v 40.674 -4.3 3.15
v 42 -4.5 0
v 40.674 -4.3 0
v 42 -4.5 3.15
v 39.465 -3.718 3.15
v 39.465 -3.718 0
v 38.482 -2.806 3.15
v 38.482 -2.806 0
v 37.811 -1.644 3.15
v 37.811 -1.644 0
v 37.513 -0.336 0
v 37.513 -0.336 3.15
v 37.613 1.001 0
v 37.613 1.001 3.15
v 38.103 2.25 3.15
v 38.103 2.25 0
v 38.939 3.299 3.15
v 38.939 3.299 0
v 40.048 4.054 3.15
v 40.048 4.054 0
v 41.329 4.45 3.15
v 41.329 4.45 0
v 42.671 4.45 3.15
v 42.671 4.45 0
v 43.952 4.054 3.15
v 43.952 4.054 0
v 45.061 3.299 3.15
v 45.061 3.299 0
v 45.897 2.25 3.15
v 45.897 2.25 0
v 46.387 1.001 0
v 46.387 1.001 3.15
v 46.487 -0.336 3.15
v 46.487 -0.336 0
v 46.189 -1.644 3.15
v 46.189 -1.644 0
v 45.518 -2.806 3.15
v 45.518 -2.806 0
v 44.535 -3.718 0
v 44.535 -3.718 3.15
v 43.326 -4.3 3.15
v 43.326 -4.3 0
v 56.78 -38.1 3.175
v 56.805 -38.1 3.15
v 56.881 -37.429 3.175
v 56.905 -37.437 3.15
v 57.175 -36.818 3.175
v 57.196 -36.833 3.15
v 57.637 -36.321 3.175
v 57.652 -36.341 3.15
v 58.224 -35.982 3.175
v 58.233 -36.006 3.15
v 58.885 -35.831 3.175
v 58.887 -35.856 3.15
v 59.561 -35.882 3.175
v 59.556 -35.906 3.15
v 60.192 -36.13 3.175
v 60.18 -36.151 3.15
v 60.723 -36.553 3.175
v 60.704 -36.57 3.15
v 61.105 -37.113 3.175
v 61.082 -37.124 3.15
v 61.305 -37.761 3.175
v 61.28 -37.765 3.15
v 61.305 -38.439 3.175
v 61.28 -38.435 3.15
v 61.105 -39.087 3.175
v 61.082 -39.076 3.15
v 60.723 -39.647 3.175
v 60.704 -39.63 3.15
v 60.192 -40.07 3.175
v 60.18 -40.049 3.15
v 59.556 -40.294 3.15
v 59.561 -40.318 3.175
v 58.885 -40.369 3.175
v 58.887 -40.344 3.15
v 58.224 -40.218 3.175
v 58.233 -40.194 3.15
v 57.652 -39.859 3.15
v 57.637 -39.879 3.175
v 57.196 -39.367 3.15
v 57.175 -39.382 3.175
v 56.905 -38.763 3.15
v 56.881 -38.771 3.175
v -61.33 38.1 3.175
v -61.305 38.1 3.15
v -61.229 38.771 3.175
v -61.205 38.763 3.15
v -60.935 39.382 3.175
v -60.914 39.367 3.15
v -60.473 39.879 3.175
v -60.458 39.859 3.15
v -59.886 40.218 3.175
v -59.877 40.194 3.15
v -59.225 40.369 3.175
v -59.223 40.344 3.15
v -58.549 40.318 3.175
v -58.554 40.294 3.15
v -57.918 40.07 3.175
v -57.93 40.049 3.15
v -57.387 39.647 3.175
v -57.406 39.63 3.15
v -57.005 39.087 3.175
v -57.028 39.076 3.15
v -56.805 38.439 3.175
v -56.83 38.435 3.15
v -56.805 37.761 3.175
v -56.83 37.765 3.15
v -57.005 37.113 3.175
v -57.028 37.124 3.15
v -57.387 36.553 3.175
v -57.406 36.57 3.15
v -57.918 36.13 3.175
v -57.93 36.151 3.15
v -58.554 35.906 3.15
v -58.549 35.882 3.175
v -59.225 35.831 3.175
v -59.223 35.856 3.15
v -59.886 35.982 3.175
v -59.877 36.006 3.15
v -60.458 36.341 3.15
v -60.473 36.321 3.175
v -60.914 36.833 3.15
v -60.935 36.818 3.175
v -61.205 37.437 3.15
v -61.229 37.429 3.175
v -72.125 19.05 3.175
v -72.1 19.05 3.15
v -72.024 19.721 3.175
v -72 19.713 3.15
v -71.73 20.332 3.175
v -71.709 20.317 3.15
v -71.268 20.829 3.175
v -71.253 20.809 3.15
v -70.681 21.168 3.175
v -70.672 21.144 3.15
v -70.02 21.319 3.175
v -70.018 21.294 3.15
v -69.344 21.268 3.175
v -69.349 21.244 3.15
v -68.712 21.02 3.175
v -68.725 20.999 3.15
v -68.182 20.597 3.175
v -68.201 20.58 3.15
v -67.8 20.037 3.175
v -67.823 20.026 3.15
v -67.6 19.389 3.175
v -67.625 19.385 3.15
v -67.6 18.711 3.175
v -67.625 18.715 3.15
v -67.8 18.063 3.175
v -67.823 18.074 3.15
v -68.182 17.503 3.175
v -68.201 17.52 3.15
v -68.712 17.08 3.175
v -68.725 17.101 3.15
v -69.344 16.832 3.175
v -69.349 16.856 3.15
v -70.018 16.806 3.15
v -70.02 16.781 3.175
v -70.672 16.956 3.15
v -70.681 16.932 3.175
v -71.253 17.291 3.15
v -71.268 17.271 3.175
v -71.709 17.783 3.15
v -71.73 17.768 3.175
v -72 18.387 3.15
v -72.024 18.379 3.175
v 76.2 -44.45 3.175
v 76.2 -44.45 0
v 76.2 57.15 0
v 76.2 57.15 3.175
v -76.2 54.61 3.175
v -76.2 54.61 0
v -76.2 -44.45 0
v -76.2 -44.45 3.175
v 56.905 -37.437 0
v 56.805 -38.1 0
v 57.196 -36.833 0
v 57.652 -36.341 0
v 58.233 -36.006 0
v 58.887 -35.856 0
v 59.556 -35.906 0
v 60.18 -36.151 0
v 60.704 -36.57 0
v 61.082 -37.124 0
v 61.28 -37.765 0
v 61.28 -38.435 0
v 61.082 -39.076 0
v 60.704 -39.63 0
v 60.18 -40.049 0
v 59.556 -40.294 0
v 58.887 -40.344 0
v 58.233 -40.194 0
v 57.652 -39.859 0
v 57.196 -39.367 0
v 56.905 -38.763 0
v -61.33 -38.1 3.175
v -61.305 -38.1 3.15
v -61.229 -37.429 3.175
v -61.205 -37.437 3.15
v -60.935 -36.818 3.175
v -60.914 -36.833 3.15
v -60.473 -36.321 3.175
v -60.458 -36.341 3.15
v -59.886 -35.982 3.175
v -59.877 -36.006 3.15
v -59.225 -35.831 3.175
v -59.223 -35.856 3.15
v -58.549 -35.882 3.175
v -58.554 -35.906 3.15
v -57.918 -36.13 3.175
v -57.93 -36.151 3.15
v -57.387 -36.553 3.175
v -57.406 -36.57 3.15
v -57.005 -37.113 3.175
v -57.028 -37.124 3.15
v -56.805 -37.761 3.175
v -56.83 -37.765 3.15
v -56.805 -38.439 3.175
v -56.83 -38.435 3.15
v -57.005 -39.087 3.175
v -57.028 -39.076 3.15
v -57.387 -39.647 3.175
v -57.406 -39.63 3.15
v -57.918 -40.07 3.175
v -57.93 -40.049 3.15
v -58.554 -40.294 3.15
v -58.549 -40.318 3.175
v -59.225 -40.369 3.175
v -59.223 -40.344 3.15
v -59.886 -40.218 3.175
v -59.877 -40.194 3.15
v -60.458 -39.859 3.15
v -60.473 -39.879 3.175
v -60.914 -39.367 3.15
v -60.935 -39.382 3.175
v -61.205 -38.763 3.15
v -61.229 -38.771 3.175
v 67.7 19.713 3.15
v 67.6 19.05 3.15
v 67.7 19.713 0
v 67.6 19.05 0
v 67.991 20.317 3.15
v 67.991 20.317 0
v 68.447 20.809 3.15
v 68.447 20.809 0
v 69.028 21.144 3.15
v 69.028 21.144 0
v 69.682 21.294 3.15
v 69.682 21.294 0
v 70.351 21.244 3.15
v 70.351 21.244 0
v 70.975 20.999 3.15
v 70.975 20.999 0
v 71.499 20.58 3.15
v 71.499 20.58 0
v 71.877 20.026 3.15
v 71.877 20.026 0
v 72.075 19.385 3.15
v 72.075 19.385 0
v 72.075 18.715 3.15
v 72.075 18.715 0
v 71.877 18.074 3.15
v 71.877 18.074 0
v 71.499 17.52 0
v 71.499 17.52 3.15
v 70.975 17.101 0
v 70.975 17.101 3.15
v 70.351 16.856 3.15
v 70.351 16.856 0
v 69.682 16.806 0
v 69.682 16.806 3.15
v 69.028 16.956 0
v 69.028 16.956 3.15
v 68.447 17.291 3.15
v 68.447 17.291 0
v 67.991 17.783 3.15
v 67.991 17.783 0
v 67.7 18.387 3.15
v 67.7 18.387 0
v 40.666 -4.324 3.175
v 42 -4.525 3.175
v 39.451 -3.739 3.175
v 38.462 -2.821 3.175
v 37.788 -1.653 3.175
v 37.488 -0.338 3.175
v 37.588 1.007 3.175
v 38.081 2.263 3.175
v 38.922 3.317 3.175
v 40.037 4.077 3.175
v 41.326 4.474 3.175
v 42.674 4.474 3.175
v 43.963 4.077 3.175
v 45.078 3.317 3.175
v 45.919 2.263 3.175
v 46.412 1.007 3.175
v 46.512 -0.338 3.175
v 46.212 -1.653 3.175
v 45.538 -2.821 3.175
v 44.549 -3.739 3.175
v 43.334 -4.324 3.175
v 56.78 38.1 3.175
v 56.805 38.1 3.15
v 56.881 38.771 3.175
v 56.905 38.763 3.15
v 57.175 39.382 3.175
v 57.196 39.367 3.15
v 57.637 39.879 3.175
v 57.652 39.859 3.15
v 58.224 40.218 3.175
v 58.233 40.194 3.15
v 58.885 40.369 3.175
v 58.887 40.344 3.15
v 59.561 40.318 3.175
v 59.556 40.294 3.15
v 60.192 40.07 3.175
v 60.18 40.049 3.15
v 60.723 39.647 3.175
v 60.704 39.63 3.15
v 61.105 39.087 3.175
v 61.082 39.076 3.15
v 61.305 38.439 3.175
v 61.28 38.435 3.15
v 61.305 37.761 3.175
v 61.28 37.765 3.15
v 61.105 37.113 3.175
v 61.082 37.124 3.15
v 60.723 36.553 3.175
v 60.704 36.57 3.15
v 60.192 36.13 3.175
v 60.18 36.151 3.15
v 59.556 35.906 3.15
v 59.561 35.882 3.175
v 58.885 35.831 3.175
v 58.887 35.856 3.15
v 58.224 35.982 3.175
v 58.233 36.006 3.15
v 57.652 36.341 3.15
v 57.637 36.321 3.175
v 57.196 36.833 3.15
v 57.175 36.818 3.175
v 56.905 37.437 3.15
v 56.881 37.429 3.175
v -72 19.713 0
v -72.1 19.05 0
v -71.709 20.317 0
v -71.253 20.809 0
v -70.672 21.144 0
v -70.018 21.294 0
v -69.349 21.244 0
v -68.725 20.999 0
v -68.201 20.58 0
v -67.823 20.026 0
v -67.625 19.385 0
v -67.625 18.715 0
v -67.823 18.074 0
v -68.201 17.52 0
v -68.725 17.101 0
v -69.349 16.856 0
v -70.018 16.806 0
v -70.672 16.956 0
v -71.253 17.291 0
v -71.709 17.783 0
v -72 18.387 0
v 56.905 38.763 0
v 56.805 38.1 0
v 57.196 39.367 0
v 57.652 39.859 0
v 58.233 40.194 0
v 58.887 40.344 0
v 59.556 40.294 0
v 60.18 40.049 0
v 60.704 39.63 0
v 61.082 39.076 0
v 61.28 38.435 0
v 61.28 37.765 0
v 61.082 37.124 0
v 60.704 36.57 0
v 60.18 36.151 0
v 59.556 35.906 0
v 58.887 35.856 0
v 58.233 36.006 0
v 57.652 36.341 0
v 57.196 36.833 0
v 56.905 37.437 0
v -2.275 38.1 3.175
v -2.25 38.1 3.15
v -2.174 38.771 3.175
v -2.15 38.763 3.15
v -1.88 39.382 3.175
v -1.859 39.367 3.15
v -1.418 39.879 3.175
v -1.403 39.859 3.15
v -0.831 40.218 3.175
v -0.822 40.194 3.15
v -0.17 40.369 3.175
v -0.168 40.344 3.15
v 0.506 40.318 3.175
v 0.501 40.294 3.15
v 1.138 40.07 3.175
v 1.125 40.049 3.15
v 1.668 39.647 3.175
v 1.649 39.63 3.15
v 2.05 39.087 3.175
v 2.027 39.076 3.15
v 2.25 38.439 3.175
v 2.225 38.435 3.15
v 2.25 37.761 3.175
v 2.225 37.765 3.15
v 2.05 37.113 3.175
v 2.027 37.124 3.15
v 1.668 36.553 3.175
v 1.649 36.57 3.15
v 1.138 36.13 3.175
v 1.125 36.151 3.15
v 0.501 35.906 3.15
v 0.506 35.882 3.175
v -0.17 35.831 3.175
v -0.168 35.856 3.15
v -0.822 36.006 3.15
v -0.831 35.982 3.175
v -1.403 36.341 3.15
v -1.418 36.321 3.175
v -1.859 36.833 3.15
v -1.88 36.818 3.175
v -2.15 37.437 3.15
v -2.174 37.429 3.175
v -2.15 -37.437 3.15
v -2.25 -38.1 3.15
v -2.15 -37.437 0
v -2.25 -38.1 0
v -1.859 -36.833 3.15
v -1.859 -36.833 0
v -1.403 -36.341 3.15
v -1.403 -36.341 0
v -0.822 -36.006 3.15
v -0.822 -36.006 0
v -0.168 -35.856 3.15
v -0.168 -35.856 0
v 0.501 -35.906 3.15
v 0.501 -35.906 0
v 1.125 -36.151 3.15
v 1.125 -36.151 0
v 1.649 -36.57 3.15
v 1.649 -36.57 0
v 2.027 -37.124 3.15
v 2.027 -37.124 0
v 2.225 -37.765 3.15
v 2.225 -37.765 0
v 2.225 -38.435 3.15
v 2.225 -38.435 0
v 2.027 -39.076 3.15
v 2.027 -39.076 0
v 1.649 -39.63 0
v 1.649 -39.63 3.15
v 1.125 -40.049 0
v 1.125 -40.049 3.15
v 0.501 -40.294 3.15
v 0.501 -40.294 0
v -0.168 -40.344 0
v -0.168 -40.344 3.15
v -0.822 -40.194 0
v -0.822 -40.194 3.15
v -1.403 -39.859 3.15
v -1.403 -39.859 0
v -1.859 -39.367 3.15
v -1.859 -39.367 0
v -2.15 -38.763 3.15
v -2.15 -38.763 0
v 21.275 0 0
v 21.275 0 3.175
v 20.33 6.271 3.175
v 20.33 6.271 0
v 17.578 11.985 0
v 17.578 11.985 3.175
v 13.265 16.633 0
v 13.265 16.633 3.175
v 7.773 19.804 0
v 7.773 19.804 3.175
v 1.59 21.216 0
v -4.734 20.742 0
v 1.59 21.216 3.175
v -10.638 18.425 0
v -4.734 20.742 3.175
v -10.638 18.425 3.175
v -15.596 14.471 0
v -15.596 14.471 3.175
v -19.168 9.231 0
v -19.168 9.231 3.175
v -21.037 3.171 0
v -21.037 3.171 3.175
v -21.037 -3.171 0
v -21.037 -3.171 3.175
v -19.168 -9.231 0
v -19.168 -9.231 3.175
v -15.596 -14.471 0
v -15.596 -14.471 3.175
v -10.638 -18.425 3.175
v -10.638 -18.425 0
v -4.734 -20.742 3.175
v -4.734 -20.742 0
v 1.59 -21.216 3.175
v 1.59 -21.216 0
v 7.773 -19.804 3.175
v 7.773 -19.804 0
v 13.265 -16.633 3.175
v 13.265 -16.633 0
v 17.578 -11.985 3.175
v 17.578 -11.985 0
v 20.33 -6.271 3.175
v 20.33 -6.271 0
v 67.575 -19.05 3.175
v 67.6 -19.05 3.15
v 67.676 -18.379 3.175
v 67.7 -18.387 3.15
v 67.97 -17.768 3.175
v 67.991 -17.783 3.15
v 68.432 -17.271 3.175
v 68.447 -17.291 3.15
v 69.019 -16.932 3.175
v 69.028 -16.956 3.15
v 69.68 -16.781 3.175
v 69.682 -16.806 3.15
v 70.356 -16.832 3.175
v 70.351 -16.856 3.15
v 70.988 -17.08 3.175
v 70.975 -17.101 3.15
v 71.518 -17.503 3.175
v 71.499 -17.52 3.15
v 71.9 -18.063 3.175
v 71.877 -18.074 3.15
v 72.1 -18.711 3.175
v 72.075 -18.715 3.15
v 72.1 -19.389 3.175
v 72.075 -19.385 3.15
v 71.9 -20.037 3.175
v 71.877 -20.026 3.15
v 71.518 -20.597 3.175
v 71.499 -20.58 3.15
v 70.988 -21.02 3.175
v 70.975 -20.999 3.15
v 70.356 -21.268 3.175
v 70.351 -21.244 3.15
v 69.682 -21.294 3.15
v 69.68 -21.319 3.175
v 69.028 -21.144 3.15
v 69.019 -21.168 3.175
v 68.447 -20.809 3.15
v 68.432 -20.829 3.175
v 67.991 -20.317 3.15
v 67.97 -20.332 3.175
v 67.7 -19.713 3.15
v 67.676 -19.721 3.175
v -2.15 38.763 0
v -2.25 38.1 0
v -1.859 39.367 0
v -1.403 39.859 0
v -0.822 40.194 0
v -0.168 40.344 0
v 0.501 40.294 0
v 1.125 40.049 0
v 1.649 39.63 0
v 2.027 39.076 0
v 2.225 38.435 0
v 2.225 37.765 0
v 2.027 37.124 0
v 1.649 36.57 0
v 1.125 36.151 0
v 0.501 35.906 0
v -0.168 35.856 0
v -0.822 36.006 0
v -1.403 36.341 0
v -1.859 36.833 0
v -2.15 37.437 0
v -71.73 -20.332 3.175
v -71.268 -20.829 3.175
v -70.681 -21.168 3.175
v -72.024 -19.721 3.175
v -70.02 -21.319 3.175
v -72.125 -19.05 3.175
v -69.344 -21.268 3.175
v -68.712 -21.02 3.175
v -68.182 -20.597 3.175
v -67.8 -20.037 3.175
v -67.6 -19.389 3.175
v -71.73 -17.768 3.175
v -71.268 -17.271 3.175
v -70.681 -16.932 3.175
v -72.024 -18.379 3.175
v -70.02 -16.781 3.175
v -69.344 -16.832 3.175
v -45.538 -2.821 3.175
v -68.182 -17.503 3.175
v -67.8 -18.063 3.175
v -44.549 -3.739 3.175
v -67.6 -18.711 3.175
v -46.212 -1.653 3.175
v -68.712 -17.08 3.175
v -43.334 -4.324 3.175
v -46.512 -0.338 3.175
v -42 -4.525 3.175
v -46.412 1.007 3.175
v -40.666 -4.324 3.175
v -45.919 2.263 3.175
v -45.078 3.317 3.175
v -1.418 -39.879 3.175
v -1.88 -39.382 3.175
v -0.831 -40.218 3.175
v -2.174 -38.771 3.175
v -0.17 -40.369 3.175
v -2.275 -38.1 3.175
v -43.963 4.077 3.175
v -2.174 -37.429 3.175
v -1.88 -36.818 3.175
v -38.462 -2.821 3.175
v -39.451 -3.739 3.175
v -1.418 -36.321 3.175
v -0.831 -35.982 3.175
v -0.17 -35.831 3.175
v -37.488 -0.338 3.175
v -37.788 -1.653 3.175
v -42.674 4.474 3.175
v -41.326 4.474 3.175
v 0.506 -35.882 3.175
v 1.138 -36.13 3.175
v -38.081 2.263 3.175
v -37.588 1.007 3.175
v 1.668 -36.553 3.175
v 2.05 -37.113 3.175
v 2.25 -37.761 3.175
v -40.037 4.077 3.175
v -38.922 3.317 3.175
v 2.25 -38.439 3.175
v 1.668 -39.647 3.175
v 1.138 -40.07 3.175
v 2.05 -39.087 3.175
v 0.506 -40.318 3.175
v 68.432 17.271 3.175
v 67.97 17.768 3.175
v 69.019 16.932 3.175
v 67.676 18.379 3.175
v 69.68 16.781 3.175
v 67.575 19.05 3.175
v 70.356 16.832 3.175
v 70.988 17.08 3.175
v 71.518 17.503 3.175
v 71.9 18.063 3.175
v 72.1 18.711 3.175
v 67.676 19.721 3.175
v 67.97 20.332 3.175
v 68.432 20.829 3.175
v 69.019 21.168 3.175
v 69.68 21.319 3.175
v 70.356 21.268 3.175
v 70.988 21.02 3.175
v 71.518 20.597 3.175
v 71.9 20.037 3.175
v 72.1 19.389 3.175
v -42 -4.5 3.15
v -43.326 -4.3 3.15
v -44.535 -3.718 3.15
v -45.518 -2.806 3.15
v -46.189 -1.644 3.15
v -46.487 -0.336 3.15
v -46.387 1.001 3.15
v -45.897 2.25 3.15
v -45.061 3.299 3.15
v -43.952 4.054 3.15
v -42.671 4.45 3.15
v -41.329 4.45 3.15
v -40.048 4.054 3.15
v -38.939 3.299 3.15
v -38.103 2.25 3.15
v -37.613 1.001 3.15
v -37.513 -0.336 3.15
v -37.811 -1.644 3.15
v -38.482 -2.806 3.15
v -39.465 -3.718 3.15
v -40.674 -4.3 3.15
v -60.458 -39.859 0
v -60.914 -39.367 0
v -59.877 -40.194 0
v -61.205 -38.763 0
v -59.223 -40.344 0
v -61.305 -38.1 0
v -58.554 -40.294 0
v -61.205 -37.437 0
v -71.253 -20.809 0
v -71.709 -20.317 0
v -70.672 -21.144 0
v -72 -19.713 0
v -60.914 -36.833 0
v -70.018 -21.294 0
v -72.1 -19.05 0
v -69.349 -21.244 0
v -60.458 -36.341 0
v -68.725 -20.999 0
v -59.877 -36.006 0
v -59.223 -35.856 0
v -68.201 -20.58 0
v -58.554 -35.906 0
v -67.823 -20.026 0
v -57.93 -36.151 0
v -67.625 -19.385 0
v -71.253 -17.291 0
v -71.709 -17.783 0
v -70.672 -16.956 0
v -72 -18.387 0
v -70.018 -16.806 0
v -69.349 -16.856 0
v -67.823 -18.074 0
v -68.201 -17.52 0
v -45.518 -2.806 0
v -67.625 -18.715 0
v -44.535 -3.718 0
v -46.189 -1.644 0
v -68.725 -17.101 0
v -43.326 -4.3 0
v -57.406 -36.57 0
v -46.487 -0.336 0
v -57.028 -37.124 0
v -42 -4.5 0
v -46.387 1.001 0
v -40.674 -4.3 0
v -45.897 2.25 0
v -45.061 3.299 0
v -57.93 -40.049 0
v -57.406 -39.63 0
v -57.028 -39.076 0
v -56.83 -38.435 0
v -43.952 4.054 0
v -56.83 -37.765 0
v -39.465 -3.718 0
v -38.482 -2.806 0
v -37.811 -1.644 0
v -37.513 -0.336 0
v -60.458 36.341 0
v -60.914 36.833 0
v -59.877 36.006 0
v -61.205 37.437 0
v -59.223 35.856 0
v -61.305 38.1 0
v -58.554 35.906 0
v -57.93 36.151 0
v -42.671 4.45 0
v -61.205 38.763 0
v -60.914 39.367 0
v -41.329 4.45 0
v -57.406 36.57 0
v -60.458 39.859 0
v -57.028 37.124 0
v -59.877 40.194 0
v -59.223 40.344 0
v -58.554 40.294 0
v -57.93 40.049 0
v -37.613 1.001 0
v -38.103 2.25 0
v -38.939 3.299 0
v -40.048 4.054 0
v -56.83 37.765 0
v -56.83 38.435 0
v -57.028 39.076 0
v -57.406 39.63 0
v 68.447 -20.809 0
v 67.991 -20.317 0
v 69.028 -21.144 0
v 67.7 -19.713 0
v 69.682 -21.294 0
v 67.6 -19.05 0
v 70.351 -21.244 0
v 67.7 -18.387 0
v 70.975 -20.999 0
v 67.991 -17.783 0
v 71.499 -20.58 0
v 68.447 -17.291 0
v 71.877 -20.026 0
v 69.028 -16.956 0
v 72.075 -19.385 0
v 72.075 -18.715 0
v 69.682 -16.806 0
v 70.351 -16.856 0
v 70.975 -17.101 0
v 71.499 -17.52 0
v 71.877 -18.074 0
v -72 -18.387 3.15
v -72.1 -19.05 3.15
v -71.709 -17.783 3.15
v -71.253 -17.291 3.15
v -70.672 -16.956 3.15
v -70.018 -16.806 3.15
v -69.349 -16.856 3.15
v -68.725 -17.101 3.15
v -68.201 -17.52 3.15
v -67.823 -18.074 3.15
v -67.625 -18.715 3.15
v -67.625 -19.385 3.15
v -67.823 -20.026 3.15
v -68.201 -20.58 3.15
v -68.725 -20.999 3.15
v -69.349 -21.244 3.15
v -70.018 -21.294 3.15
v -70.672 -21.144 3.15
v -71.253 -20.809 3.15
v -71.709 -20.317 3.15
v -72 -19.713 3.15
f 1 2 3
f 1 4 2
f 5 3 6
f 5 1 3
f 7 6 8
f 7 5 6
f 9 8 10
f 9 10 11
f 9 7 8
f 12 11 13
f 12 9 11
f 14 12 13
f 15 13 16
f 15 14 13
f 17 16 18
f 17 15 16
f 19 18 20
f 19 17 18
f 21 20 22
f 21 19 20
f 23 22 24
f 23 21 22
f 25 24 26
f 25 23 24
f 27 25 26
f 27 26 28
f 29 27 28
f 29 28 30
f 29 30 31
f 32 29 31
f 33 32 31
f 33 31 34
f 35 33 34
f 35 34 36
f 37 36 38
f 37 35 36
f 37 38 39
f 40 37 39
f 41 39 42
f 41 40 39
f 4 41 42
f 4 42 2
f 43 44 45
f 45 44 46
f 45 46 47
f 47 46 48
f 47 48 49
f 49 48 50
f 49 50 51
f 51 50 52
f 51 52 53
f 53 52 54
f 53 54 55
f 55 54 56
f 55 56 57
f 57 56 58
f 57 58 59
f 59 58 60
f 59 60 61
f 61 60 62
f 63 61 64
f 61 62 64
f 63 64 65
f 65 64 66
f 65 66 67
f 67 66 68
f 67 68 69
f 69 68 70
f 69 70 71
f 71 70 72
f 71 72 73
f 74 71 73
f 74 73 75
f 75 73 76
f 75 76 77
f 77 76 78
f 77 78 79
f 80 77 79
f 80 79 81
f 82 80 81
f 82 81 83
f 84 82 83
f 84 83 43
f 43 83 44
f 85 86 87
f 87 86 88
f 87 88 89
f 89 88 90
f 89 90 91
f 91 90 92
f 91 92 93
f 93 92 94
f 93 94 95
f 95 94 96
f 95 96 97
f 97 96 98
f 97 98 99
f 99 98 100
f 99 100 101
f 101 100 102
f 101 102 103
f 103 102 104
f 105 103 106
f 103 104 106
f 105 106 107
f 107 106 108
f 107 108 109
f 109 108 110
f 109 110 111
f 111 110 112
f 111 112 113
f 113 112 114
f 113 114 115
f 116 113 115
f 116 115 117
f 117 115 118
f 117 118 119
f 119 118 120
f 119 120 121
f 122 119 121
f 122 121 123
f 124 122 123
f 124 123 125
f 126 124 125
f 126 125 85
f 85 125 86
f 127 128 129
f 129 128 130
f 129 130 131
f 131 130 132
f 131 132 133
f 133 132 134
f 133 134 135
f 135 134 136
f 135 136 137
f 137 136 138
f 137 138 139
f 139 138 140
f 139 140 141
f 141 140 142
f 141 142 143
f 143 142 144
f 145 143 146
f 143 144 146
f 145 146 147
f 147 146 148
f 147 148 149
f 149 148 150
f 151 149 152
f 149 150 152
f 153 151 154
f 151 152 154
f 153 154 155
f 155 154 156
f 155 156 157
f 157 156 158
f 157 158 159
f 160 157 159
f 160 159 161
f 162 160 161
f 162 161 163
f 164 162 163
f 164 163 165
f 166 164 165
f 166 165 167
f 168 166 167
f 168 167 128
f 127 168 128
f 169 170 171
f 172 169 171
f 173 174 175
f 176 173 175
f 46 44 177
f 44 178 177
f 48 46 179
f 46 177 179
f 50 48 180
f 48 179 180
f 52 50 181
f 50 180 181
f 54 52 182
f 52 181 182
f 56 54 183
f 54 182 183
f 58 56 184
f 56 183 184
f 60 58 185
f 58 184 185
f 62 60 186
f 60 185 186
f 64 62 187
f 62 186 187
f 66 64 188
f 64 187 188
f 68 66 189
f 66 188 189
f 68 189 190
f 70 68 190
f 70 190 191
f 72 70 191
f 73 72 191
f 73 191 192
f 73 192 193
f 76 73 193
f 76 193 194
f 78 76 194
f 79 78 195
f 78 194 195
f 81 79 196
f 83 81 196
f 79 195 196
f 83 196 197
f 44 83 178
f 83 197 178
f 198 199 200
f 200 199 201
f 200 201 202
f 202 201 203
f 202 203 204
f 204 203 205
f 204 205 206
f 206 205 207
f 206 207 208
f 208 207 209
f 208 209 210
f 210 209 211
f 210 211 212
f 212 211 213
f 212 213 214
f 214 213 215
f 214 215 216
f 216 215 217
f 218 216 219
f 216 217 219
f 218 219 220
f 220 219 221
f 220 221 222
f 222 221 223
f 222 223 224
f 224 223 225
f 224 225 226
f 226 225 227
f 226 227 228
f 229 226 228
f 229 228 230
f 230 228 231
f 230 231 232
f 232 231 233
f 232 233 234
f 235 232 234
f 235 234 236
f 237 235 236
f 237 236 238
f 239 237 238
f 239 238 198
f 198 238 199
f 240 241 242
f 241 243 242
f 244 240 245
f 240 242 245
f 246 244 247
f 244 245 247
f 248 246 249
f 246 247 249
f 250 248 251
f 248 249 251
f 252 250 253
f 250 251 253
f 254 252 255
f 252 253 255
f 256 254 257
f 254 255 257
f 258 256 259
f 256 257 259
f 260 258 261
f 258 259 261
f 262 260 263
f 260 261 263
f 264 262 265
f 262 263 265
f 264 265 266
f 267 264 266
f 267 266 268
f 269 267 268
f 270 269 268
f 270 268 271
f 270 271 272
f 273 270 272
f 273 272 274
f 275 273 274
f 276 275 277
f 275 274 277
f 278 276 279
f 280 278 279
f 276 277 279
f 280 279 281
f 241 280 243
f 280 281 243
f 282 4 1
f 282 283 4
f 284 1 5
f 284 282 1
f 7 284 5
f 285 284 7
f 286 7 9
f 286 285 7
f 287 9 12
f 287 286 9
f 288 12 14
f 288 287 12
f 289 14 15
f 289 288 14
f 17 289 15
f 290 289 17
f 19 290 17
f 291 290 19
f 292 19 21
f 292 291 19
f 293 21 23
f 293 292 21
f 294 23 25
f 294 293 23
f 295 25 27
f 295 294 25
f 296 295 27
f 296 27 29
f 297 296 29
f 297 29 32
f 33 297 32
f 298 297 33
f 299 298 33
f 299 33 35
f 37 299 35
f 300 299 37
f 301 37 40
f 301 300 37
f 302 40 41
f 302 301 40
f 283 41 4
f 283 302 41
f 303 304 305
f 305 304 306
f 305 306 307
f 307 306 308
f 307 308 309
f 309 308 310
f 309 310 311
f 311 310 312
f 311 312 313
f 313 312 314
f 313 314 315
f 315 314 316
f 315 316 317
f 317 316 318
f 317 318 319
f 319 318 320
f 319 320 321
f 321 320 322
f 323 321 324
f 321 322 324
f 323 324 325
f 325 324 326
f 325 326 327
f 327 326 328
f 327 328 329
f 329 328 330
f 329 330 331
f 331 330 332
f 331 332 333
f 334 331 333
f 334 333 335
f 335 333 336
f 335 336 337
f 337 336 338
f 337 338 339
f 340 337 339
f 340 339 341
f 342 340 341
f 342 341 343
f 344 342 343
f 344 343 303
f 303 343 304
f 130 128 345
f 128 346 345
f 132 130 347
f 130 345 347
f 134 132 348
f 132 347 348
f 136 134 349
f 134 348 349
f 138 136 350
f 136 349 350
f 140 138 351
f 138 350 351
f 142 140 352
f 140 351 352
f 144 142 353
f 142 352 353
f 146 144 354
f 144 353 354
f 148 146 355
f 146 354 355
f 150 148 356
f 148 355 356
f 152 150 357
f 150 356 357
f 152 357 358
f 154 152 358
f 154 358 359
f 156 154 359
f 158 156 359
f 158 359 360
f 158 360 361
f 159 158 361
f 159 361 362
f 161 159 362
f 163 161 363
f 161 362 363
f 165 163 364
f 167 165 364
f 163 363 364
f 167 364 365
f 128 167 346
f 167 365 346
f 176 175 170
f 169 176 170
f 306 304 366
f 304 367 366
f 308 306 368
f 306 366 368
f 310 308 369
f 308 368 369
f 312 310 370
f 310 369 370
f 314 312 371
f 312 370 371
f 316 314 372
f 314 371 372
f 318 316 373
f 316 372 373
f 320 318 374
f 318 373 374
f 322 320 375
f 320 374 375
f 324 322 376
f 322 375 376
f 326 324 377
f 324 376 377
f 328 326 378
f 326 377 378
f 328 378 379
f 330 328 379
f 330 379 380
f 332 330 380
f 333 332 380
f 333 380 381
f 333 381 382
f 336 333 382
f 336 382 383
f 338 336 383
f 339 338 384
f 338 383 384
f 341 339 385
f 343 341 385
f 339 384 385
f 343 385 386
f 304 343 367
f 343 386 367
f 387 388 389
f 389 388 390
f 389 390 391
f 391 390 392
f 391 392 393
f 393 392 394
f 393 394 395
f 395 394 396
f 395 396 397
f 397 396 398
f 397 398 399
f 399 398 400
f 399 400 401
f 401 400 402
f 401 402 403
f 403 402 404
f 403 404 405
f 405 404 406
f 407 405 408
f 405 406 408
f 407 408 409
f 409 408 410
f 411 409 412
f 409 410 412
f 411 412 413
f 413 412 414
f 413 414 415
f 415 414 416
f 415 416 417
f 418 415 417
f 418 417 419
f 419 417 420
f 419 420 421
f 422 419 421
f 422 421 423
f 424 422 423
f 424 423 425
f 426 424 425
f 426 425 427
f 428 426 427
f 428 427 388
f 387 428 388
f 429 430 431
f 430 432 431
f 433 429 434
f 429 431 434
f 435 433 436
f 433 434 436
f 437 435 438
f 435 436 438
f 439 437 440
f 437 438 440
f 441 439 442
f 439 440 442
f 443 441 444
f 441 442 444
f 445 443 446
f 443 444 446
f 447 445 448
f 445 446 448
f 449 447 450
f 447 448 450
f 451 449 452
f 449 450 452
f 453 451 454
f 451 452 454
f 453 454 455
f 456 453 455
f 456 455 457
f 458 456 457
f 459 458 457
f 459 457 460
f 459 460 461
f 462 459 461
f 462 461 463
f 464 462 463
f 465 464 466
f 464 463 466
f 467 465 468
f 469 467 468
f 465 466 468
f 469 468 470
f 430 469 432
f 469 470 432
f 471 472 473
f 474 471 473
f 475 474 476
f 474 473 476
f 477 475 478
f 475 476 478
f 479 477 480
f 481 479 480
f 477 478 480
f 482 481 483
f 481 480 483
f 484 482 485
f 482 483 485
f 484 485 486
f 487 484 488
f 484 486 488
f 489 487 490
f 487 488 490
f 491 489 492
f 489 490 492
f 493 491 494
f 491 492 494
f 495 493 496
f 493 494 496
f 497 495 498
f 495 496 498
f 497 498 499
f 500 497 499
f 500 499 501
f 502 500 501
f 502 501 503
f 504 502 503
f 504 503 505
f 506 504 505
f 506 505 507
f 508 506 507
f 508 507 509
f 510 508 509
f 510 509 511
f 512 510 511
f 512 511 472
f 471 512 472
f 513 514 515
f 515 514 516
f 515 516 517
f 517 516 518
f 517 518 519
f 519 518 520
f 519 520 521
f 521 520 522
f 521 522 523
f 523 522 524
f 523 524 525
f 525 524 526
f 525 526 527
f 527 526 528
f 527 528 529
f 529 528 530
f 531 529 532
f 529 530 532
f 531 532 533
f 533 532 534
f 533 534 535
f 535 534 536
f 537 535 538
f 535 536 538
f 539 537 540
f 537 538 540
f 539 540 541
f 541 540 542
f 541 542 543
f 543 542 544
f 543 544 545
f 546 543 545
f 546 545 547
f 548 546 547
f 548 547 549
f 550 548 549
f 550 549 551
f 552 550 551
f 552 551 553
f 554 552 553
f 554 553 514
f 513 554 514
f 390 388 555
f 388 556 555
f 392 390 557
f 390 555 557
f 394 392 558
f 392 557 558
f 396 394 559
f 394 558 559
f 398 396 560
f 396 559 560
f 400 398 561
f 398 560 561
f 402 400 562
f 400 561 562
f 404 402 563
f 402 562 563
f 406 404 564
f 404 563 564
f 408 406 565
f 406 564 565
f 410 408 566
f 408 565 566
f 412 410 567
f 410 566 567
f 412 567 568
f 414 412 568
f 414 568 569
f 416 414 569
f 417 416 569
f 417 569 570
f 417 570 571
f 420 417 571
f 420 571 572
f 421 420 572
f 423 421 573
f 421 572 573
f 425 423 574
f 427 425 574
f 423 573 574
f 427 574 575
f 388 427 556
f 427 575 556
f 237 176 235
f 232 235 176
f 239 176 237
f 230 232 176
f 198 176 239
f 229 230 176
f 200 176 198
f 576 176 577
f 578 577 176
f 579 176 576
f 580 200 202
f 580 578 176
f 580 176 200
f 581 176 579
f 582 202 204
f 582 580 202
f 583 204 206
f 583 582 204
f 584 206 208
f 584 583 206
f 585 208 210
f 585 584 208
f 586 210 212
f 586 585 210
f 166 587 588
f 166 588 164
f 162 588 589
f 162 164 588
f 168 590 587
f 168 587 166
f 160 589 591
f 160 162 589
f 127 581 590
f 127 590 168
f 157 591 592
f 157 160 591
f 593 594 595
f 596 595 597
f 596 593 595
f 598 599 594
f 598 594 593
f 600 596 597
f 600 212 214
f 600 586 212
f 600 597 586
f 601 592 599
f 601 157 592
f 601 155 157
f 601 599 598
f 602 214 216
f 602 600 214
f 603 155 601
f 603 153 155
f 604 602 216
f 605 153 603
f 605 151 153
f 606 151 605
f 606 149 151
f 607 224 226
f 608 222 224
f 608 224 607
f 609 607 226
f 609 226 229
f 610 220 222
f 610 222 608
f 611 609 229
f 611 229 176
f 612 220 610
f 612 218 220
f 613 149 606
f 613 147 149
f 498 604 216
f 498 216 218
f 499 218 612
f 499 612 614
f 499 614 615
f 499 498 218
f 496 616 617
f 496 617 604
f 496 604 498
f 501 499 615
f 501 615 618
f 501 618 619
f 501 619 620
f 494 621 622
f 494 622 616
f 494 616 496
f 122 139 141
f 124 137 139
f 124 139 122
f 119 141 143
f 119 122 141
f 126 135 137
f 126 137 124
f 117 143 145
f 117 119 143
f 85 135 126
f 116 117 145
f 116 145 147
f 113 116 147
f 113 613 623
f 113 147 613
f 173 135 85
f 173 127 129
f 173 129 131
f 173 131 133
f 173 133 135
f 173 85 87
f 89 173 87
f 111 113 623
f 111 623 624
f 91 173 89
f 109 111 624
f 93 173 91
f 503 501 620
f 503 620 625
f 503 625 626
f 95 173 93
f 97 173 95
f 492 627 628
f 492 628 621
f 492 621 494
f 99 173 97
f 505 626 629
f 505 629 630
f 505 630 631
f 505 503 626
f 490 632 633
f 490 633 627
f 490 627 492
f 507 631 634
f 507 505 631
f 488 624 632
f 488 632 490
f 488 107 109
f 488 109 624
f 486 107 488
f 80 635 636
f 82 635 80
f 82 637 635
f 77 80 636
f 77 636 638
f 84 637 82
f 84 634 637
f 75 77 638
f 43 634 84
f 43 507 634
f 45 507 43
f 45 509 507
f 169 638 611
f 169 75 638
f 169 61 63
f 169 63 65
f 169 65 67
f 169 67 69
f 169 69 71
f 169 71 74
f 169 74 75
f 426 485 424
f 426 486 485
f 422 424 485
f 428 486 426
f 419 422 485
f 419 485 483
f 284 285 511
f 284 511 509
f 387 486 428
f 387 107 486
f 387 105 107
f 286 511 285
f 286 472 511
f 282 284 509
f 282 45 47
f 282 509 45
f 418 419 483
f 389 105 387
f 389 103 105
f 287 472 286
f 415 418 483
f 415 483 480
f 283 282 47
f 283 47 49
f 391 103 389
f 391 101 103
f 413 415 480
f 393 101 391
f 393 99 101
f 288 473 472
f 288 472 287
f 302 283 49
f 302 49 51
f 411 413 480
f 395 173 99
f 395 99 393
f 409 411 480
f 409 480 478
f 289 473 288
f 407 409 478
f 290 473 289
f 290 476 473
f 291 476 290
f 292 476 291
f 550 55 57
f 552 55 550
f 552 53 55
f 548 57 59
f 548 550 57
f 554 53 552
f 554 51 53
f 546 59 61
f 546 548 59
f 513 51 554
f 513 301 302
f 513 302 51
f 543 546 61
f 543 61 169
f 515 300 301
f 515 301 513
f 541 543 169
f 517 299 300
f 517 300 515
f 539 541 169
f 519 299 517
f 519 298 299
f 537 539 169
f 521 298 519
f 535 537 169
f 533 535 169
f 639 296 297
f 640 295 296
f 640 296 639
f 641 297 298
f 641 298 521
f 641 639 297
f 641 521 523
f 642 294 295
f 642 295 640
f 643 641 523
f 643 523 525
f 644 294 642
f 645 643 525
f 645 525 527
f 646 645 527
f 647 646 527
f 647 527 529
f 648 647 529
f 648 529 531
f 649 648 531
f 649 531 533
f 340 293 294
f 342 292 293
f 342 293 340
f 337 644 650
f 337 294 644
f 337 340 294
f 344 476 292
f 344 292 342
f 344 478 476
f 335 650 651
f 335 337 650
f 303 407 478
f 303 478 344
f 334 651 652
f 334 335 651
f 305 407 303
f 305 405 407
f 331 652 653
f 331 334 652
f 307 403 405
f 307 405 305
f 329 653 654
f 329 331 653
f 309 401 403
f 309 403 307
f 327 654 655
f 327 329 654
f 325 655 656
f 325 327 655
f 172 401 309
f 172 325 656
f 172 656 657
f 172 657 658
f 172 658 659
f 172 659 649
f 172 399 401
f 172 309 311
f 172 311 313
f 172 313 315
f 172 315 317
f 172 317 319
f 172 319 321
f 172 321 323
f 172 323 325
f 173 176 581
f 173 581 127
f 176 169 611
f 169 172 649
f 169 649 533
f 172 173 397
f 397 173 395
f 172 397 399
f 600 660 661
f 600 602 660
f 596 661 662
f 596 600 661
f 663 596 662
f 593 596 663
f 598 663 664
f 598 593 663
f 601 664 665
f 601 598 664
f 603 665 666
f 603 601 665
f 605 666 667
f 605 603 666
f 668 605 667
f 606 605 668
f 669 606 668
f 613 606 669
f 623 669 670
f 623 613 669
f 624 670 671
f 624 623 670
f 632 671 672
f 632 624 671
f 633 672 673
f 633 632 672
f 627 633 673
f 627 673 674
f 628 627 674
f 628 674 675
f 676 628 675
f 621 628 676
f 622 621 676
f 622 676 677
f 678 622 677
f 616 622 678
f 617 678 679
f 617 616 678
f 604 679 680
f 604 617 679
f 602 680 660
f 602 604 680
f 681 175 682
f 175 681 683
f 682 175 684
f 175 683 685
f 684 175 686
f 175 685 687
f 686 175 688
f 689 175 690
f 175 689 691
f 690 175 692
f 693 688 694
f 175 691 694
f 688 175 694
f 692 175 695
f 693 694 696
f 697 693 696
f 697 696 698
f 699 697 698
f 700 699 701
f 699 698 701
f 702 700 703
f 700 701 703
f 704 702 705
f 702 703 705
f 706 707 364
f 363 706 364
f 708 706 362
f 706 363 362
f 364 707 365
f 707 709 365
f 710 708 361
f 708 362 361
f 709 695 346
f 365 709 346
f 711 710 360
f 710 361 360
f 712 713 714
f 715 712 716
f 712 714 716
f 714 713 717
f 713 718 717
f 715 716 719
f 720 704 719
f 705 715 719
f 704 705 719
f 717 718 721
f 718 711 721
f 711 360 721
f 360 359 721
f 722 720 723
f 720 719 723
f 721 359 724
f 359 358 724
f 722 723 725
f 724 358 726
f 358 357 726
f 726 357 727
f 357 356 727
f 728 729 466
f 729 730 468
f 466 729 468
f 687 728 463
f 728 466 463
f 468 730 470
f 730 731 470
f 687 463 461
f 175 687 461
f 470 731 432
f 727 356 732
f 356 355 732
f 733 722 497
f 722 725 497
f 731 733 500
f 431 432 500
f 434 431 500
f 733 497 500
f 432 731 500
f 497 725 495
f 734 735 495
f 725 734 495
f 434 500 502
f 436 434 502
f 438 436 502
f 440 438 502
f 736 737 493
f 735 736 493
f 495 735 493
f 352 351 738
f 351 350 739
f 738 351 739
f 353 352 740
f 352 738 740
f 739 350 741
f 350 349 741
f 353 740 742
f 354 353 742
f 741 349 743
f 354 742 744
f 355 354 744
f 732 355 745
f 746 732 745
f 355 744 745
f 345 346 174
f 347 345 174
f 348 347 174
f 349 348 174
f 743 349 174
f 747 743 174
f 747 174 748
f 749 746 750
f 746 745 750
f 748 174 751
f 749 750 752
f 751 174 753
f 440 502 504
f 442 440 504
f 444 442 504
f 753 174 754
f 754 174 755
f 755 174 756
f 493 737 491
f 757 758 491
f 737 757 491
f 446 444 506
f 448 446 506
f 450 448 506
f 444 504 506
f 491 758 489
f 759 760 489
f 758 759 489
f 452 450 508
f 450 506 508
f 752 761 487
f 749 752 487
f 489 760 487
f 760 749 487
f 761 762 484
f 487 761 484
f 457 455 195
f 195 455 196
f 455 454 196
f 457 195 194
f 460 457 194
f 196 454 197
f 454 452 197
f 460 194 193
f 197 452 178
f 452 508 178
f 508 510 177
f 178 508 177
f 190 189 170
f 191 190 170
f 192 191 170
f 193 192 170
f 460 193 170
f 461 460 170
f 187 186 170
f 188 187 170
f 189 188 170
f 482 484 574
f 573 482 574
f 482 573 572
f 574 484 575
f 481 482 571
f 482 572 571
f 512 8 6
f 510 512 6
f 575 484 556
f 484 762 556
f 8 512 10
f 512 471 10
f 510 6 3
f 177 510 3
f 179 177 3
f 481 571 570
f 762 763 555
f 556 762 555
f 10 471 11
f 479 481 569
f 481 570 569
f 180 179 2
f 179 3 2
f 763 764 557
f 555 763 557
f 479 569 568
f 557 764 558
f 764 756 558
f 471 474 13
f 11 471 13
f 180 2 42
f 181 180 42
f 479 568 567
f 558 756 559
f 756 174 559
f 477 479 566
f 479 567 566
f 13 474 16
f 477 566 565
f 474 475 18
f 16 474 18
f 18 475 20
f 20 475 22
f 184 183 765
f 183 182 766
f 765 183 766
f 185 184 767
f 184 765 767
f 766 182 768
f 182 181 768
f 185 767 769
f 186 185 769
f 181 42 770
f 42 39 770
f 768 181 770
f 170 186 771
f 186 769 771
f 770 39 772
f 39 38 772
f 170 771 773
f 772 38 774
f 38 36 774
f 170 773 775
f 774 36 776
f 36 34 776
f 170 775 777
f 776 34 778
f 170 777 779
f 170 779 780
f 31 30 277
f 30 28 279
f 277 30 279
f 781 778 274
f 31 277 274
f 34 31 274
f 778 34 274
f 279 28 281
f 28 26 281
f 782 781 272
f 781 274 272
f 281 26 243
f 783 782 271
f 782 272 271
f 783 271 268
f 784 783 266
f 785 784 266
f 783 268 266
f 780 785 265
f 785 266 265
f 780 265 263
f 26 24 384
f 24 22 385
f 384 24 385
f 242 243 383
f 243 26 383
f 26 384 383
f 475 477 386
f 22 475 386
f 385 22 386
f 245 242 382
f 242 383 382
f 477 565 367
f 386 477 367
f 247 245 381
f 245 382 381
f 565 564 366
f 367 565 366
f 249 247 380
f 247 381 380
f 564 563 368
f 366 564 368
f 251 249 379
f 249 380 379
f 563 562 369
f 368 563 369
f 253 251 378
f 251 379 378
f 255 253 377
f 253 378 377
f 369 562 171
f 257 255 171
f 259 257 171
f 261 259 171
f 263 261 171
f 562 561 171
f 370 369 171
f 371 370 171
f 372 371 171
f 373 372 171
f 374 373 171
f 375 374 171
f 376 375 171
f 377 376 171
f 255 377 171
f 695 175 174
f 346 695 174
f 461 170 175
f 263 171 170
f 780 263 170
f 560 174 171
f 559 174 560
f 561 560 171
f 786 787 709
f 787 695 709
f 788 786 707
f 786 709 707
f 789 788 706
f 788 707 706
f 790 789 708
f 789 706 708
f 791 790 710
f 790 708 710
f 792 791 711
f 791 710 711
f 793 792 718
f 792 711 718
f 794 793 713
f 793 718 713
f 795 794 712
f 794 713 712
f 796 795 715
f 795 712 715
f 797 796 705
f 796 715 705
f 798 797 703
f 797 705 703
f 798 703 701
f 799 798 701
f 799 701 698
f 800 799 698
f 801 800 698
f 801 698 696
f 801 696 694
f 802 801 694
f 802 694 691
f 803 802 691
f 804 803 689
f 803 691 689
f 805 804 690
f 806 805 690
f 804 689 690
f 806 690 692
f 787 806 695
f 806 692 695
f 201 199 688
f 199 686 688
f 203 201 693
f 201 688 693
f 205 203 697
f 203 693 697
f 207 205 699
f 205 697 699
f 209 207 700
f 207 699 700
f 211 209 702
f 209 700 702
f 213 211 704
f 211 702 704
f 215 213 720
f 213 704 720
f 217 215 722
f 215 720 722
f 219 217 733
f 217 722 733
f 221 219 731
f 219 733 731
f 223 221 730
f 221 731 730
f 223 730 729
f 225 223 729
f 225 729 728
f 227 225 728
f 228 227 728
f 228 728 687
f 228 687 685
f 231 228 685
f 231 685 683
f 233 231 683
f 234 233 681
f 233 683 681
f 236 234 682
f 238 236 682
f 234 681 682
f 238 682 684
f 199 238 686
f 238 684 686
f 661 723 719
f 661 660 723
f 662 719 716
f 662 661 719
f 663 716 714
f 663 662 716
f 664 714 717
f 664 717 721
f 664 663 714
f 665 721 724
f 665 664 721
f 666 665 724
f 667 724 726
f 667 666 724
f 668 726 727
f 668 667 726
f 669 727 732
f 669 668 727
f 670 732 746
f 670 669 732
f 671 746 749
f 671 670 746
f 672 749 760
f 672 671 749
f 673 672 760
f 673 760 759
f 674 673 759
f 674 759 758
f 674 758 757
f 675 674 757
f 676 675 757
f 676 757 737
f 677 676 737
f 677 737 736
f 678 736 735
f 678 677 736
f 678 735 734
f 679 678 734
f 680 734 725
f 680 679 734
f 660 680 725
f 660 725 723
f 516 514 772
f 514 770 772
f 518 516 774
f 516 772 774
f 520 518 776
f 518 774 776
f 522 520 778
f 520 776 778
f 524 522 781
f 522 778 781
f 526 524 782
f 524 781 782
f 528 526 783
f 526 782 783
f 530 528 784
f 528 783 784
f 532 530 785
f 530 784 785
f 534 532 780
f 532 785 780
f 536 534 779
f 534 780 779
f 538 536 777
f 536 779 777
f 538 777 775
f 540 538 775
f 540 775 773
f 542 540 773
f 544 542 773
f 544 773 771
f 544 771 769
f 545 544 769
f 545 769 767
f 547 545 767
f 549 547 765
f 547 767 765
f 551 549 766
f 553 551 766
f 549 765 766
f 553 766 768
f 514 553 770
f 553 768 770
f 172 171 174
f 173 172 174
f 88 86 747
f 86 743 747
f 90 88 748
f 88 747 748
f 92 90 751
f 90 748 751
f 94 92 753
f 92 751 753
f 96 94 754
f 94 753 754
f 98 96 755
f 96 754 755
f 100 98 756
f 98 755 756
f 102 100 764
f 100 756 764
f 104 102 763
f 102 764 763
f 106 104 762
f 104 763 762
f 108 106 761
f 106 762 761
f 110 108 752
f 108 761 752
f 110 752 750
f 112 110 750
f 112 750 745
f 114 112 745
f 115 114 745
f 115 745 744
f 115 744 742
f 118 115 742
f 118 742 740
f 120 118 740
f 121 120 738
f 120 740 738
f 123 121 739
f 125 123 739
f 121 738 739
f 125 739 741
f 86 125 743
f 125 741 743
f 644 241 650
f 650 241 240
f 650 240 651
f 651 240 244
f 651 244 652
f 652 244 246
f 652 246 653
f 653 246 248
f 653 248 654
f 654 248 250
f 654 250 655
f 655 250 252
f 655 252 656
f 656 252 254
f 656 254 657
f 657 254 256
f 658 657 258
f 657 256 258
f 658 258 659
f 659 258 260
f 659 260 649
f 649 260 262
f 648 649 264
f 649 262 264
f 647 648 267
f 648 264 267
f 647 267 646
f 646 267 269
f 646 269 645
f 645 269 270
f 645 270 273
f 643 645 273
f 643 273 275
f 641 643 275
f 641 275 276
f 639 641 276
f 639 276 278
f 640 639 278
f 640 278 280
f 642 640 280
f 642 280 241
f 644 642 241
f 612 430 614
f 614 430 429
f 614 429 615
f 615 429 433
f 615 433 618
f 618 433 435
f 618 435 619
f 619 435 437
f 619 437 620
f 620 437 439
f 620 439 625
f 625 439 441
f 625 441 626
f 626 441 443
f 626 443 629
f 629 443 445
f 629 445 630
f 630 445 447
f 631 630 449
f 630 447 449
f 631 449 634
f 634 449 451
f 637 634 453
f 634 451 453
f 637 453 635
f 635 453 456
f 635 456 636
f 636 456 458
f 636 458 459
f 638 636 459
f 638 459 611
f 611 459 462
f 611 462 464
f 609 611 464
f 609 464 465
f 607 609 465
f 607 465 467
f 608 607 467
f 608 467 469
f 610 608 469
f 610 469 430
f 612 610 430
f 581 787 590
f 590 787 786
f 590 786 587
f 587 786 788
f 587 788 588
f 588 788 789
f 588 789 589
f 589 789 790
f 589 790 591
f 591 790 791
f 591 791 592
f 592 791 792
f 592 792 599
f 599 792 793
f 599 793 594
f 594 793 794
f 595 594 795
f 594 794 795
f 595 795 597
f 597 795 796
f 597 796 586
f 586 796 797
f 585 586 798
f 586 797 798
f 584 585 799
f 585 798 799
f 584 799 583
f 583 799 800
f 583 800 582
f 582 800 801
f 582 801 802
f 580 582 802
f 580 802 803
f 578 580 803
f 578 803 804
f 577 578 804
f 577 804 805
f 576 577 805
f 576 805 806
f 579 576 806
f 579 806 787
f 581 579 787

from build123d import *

# Parameters (mm, degrees)
BOSS_EXTRUDE1_DEPTH            = 3.175
M4_CLEARANCE_HOLE1_D           = 4.5
M4_CLEARANCE_HOLE1_CSINK_D     = 4.55
M4_CLEARANCE_HOLE1_CSINK_ANGLE = 90
M8_CLEARANCE_HOLE1_AT_2_COUNT  = 2
M8_CLEARANCE_HOLE1_AT_2_PITCH  = 84
SKETCH9_R                      = 21.275
CENTER_HOLE_DEPTH              = 96.302901976


with BuildPart() as part:
    # Sketch1 → Boss-Extrude1 (new body)
    with BuildSketch(Plane.XY):
        Polygon((-76.2, 54.61), (-76.2, 44.45), (-76.2, -44.45), (76.2, -44.45), (76.2, 44.45), (76.2, 57.15), align=None)
    extrude(amount=BOSS_EXTRUDE1_DEPTH)

    # M4 Clearance Hole1 (through all)
    with Locations(Plane.XY.offset(3.175)):
        with Locations((-69.85, 19.05), (-59.055, 38.1), (0, 38.1), (59.055, 38.1), (69.85, 19.05), (69.85, -19.05), (59.055, -38.1), (0, -38.1), (-59.055, -38.1), (-69.85, -19.05)):
            CounterSinkHole(M4_CLEARANCE_HOLE1_D / 2, M4_CLEARANCE_HOLE1_CSINK_D / 2, counter_sink_angle=M4_CLEARANCE_HOLE1_CSINK_ANGLE)

    # Sketch11 → M8 Clearance Hole1 (revolve, cut)
    with BuildSketch(Plane(origin=(-42, 0, 3.175), x_dir=(0, -1, 0), z_dir=(1, 0, 0))):
        Polygon((0, 0), (0, 3.175), (4.5, 3.175), (4.5, 0.025), (4.525, 0), align=None)
    m8_clearance_hole1 = revolve(axis=Axis((-42, 0, 9.525), (0, 0, -1)), mode=Mode.SUBTRACT)

    # M8 Clearance Hole1 at 2: M8 Clearance Hole1 ×2
    with Locations(*[(i * M8_CLEARANCE_HOLE1_AT_2_PITCH, 0, 0) for i in range(1, M8_CLEARANCE_HOLE1_AT_2_COUNT)]):
        add(m8_clearance_hole1, mode=Mode.SUBTRACT)

    # Sketch9 → Center Hole (cut, through all)
    with BuildSketch(Plane.XY.offset(3.175)):
        Circle(SKETCH9_R)
    extrude(amount=-CENTER_HOLE_DEPTH, mode=Mode.SUBTRACT)


solid = part.part
